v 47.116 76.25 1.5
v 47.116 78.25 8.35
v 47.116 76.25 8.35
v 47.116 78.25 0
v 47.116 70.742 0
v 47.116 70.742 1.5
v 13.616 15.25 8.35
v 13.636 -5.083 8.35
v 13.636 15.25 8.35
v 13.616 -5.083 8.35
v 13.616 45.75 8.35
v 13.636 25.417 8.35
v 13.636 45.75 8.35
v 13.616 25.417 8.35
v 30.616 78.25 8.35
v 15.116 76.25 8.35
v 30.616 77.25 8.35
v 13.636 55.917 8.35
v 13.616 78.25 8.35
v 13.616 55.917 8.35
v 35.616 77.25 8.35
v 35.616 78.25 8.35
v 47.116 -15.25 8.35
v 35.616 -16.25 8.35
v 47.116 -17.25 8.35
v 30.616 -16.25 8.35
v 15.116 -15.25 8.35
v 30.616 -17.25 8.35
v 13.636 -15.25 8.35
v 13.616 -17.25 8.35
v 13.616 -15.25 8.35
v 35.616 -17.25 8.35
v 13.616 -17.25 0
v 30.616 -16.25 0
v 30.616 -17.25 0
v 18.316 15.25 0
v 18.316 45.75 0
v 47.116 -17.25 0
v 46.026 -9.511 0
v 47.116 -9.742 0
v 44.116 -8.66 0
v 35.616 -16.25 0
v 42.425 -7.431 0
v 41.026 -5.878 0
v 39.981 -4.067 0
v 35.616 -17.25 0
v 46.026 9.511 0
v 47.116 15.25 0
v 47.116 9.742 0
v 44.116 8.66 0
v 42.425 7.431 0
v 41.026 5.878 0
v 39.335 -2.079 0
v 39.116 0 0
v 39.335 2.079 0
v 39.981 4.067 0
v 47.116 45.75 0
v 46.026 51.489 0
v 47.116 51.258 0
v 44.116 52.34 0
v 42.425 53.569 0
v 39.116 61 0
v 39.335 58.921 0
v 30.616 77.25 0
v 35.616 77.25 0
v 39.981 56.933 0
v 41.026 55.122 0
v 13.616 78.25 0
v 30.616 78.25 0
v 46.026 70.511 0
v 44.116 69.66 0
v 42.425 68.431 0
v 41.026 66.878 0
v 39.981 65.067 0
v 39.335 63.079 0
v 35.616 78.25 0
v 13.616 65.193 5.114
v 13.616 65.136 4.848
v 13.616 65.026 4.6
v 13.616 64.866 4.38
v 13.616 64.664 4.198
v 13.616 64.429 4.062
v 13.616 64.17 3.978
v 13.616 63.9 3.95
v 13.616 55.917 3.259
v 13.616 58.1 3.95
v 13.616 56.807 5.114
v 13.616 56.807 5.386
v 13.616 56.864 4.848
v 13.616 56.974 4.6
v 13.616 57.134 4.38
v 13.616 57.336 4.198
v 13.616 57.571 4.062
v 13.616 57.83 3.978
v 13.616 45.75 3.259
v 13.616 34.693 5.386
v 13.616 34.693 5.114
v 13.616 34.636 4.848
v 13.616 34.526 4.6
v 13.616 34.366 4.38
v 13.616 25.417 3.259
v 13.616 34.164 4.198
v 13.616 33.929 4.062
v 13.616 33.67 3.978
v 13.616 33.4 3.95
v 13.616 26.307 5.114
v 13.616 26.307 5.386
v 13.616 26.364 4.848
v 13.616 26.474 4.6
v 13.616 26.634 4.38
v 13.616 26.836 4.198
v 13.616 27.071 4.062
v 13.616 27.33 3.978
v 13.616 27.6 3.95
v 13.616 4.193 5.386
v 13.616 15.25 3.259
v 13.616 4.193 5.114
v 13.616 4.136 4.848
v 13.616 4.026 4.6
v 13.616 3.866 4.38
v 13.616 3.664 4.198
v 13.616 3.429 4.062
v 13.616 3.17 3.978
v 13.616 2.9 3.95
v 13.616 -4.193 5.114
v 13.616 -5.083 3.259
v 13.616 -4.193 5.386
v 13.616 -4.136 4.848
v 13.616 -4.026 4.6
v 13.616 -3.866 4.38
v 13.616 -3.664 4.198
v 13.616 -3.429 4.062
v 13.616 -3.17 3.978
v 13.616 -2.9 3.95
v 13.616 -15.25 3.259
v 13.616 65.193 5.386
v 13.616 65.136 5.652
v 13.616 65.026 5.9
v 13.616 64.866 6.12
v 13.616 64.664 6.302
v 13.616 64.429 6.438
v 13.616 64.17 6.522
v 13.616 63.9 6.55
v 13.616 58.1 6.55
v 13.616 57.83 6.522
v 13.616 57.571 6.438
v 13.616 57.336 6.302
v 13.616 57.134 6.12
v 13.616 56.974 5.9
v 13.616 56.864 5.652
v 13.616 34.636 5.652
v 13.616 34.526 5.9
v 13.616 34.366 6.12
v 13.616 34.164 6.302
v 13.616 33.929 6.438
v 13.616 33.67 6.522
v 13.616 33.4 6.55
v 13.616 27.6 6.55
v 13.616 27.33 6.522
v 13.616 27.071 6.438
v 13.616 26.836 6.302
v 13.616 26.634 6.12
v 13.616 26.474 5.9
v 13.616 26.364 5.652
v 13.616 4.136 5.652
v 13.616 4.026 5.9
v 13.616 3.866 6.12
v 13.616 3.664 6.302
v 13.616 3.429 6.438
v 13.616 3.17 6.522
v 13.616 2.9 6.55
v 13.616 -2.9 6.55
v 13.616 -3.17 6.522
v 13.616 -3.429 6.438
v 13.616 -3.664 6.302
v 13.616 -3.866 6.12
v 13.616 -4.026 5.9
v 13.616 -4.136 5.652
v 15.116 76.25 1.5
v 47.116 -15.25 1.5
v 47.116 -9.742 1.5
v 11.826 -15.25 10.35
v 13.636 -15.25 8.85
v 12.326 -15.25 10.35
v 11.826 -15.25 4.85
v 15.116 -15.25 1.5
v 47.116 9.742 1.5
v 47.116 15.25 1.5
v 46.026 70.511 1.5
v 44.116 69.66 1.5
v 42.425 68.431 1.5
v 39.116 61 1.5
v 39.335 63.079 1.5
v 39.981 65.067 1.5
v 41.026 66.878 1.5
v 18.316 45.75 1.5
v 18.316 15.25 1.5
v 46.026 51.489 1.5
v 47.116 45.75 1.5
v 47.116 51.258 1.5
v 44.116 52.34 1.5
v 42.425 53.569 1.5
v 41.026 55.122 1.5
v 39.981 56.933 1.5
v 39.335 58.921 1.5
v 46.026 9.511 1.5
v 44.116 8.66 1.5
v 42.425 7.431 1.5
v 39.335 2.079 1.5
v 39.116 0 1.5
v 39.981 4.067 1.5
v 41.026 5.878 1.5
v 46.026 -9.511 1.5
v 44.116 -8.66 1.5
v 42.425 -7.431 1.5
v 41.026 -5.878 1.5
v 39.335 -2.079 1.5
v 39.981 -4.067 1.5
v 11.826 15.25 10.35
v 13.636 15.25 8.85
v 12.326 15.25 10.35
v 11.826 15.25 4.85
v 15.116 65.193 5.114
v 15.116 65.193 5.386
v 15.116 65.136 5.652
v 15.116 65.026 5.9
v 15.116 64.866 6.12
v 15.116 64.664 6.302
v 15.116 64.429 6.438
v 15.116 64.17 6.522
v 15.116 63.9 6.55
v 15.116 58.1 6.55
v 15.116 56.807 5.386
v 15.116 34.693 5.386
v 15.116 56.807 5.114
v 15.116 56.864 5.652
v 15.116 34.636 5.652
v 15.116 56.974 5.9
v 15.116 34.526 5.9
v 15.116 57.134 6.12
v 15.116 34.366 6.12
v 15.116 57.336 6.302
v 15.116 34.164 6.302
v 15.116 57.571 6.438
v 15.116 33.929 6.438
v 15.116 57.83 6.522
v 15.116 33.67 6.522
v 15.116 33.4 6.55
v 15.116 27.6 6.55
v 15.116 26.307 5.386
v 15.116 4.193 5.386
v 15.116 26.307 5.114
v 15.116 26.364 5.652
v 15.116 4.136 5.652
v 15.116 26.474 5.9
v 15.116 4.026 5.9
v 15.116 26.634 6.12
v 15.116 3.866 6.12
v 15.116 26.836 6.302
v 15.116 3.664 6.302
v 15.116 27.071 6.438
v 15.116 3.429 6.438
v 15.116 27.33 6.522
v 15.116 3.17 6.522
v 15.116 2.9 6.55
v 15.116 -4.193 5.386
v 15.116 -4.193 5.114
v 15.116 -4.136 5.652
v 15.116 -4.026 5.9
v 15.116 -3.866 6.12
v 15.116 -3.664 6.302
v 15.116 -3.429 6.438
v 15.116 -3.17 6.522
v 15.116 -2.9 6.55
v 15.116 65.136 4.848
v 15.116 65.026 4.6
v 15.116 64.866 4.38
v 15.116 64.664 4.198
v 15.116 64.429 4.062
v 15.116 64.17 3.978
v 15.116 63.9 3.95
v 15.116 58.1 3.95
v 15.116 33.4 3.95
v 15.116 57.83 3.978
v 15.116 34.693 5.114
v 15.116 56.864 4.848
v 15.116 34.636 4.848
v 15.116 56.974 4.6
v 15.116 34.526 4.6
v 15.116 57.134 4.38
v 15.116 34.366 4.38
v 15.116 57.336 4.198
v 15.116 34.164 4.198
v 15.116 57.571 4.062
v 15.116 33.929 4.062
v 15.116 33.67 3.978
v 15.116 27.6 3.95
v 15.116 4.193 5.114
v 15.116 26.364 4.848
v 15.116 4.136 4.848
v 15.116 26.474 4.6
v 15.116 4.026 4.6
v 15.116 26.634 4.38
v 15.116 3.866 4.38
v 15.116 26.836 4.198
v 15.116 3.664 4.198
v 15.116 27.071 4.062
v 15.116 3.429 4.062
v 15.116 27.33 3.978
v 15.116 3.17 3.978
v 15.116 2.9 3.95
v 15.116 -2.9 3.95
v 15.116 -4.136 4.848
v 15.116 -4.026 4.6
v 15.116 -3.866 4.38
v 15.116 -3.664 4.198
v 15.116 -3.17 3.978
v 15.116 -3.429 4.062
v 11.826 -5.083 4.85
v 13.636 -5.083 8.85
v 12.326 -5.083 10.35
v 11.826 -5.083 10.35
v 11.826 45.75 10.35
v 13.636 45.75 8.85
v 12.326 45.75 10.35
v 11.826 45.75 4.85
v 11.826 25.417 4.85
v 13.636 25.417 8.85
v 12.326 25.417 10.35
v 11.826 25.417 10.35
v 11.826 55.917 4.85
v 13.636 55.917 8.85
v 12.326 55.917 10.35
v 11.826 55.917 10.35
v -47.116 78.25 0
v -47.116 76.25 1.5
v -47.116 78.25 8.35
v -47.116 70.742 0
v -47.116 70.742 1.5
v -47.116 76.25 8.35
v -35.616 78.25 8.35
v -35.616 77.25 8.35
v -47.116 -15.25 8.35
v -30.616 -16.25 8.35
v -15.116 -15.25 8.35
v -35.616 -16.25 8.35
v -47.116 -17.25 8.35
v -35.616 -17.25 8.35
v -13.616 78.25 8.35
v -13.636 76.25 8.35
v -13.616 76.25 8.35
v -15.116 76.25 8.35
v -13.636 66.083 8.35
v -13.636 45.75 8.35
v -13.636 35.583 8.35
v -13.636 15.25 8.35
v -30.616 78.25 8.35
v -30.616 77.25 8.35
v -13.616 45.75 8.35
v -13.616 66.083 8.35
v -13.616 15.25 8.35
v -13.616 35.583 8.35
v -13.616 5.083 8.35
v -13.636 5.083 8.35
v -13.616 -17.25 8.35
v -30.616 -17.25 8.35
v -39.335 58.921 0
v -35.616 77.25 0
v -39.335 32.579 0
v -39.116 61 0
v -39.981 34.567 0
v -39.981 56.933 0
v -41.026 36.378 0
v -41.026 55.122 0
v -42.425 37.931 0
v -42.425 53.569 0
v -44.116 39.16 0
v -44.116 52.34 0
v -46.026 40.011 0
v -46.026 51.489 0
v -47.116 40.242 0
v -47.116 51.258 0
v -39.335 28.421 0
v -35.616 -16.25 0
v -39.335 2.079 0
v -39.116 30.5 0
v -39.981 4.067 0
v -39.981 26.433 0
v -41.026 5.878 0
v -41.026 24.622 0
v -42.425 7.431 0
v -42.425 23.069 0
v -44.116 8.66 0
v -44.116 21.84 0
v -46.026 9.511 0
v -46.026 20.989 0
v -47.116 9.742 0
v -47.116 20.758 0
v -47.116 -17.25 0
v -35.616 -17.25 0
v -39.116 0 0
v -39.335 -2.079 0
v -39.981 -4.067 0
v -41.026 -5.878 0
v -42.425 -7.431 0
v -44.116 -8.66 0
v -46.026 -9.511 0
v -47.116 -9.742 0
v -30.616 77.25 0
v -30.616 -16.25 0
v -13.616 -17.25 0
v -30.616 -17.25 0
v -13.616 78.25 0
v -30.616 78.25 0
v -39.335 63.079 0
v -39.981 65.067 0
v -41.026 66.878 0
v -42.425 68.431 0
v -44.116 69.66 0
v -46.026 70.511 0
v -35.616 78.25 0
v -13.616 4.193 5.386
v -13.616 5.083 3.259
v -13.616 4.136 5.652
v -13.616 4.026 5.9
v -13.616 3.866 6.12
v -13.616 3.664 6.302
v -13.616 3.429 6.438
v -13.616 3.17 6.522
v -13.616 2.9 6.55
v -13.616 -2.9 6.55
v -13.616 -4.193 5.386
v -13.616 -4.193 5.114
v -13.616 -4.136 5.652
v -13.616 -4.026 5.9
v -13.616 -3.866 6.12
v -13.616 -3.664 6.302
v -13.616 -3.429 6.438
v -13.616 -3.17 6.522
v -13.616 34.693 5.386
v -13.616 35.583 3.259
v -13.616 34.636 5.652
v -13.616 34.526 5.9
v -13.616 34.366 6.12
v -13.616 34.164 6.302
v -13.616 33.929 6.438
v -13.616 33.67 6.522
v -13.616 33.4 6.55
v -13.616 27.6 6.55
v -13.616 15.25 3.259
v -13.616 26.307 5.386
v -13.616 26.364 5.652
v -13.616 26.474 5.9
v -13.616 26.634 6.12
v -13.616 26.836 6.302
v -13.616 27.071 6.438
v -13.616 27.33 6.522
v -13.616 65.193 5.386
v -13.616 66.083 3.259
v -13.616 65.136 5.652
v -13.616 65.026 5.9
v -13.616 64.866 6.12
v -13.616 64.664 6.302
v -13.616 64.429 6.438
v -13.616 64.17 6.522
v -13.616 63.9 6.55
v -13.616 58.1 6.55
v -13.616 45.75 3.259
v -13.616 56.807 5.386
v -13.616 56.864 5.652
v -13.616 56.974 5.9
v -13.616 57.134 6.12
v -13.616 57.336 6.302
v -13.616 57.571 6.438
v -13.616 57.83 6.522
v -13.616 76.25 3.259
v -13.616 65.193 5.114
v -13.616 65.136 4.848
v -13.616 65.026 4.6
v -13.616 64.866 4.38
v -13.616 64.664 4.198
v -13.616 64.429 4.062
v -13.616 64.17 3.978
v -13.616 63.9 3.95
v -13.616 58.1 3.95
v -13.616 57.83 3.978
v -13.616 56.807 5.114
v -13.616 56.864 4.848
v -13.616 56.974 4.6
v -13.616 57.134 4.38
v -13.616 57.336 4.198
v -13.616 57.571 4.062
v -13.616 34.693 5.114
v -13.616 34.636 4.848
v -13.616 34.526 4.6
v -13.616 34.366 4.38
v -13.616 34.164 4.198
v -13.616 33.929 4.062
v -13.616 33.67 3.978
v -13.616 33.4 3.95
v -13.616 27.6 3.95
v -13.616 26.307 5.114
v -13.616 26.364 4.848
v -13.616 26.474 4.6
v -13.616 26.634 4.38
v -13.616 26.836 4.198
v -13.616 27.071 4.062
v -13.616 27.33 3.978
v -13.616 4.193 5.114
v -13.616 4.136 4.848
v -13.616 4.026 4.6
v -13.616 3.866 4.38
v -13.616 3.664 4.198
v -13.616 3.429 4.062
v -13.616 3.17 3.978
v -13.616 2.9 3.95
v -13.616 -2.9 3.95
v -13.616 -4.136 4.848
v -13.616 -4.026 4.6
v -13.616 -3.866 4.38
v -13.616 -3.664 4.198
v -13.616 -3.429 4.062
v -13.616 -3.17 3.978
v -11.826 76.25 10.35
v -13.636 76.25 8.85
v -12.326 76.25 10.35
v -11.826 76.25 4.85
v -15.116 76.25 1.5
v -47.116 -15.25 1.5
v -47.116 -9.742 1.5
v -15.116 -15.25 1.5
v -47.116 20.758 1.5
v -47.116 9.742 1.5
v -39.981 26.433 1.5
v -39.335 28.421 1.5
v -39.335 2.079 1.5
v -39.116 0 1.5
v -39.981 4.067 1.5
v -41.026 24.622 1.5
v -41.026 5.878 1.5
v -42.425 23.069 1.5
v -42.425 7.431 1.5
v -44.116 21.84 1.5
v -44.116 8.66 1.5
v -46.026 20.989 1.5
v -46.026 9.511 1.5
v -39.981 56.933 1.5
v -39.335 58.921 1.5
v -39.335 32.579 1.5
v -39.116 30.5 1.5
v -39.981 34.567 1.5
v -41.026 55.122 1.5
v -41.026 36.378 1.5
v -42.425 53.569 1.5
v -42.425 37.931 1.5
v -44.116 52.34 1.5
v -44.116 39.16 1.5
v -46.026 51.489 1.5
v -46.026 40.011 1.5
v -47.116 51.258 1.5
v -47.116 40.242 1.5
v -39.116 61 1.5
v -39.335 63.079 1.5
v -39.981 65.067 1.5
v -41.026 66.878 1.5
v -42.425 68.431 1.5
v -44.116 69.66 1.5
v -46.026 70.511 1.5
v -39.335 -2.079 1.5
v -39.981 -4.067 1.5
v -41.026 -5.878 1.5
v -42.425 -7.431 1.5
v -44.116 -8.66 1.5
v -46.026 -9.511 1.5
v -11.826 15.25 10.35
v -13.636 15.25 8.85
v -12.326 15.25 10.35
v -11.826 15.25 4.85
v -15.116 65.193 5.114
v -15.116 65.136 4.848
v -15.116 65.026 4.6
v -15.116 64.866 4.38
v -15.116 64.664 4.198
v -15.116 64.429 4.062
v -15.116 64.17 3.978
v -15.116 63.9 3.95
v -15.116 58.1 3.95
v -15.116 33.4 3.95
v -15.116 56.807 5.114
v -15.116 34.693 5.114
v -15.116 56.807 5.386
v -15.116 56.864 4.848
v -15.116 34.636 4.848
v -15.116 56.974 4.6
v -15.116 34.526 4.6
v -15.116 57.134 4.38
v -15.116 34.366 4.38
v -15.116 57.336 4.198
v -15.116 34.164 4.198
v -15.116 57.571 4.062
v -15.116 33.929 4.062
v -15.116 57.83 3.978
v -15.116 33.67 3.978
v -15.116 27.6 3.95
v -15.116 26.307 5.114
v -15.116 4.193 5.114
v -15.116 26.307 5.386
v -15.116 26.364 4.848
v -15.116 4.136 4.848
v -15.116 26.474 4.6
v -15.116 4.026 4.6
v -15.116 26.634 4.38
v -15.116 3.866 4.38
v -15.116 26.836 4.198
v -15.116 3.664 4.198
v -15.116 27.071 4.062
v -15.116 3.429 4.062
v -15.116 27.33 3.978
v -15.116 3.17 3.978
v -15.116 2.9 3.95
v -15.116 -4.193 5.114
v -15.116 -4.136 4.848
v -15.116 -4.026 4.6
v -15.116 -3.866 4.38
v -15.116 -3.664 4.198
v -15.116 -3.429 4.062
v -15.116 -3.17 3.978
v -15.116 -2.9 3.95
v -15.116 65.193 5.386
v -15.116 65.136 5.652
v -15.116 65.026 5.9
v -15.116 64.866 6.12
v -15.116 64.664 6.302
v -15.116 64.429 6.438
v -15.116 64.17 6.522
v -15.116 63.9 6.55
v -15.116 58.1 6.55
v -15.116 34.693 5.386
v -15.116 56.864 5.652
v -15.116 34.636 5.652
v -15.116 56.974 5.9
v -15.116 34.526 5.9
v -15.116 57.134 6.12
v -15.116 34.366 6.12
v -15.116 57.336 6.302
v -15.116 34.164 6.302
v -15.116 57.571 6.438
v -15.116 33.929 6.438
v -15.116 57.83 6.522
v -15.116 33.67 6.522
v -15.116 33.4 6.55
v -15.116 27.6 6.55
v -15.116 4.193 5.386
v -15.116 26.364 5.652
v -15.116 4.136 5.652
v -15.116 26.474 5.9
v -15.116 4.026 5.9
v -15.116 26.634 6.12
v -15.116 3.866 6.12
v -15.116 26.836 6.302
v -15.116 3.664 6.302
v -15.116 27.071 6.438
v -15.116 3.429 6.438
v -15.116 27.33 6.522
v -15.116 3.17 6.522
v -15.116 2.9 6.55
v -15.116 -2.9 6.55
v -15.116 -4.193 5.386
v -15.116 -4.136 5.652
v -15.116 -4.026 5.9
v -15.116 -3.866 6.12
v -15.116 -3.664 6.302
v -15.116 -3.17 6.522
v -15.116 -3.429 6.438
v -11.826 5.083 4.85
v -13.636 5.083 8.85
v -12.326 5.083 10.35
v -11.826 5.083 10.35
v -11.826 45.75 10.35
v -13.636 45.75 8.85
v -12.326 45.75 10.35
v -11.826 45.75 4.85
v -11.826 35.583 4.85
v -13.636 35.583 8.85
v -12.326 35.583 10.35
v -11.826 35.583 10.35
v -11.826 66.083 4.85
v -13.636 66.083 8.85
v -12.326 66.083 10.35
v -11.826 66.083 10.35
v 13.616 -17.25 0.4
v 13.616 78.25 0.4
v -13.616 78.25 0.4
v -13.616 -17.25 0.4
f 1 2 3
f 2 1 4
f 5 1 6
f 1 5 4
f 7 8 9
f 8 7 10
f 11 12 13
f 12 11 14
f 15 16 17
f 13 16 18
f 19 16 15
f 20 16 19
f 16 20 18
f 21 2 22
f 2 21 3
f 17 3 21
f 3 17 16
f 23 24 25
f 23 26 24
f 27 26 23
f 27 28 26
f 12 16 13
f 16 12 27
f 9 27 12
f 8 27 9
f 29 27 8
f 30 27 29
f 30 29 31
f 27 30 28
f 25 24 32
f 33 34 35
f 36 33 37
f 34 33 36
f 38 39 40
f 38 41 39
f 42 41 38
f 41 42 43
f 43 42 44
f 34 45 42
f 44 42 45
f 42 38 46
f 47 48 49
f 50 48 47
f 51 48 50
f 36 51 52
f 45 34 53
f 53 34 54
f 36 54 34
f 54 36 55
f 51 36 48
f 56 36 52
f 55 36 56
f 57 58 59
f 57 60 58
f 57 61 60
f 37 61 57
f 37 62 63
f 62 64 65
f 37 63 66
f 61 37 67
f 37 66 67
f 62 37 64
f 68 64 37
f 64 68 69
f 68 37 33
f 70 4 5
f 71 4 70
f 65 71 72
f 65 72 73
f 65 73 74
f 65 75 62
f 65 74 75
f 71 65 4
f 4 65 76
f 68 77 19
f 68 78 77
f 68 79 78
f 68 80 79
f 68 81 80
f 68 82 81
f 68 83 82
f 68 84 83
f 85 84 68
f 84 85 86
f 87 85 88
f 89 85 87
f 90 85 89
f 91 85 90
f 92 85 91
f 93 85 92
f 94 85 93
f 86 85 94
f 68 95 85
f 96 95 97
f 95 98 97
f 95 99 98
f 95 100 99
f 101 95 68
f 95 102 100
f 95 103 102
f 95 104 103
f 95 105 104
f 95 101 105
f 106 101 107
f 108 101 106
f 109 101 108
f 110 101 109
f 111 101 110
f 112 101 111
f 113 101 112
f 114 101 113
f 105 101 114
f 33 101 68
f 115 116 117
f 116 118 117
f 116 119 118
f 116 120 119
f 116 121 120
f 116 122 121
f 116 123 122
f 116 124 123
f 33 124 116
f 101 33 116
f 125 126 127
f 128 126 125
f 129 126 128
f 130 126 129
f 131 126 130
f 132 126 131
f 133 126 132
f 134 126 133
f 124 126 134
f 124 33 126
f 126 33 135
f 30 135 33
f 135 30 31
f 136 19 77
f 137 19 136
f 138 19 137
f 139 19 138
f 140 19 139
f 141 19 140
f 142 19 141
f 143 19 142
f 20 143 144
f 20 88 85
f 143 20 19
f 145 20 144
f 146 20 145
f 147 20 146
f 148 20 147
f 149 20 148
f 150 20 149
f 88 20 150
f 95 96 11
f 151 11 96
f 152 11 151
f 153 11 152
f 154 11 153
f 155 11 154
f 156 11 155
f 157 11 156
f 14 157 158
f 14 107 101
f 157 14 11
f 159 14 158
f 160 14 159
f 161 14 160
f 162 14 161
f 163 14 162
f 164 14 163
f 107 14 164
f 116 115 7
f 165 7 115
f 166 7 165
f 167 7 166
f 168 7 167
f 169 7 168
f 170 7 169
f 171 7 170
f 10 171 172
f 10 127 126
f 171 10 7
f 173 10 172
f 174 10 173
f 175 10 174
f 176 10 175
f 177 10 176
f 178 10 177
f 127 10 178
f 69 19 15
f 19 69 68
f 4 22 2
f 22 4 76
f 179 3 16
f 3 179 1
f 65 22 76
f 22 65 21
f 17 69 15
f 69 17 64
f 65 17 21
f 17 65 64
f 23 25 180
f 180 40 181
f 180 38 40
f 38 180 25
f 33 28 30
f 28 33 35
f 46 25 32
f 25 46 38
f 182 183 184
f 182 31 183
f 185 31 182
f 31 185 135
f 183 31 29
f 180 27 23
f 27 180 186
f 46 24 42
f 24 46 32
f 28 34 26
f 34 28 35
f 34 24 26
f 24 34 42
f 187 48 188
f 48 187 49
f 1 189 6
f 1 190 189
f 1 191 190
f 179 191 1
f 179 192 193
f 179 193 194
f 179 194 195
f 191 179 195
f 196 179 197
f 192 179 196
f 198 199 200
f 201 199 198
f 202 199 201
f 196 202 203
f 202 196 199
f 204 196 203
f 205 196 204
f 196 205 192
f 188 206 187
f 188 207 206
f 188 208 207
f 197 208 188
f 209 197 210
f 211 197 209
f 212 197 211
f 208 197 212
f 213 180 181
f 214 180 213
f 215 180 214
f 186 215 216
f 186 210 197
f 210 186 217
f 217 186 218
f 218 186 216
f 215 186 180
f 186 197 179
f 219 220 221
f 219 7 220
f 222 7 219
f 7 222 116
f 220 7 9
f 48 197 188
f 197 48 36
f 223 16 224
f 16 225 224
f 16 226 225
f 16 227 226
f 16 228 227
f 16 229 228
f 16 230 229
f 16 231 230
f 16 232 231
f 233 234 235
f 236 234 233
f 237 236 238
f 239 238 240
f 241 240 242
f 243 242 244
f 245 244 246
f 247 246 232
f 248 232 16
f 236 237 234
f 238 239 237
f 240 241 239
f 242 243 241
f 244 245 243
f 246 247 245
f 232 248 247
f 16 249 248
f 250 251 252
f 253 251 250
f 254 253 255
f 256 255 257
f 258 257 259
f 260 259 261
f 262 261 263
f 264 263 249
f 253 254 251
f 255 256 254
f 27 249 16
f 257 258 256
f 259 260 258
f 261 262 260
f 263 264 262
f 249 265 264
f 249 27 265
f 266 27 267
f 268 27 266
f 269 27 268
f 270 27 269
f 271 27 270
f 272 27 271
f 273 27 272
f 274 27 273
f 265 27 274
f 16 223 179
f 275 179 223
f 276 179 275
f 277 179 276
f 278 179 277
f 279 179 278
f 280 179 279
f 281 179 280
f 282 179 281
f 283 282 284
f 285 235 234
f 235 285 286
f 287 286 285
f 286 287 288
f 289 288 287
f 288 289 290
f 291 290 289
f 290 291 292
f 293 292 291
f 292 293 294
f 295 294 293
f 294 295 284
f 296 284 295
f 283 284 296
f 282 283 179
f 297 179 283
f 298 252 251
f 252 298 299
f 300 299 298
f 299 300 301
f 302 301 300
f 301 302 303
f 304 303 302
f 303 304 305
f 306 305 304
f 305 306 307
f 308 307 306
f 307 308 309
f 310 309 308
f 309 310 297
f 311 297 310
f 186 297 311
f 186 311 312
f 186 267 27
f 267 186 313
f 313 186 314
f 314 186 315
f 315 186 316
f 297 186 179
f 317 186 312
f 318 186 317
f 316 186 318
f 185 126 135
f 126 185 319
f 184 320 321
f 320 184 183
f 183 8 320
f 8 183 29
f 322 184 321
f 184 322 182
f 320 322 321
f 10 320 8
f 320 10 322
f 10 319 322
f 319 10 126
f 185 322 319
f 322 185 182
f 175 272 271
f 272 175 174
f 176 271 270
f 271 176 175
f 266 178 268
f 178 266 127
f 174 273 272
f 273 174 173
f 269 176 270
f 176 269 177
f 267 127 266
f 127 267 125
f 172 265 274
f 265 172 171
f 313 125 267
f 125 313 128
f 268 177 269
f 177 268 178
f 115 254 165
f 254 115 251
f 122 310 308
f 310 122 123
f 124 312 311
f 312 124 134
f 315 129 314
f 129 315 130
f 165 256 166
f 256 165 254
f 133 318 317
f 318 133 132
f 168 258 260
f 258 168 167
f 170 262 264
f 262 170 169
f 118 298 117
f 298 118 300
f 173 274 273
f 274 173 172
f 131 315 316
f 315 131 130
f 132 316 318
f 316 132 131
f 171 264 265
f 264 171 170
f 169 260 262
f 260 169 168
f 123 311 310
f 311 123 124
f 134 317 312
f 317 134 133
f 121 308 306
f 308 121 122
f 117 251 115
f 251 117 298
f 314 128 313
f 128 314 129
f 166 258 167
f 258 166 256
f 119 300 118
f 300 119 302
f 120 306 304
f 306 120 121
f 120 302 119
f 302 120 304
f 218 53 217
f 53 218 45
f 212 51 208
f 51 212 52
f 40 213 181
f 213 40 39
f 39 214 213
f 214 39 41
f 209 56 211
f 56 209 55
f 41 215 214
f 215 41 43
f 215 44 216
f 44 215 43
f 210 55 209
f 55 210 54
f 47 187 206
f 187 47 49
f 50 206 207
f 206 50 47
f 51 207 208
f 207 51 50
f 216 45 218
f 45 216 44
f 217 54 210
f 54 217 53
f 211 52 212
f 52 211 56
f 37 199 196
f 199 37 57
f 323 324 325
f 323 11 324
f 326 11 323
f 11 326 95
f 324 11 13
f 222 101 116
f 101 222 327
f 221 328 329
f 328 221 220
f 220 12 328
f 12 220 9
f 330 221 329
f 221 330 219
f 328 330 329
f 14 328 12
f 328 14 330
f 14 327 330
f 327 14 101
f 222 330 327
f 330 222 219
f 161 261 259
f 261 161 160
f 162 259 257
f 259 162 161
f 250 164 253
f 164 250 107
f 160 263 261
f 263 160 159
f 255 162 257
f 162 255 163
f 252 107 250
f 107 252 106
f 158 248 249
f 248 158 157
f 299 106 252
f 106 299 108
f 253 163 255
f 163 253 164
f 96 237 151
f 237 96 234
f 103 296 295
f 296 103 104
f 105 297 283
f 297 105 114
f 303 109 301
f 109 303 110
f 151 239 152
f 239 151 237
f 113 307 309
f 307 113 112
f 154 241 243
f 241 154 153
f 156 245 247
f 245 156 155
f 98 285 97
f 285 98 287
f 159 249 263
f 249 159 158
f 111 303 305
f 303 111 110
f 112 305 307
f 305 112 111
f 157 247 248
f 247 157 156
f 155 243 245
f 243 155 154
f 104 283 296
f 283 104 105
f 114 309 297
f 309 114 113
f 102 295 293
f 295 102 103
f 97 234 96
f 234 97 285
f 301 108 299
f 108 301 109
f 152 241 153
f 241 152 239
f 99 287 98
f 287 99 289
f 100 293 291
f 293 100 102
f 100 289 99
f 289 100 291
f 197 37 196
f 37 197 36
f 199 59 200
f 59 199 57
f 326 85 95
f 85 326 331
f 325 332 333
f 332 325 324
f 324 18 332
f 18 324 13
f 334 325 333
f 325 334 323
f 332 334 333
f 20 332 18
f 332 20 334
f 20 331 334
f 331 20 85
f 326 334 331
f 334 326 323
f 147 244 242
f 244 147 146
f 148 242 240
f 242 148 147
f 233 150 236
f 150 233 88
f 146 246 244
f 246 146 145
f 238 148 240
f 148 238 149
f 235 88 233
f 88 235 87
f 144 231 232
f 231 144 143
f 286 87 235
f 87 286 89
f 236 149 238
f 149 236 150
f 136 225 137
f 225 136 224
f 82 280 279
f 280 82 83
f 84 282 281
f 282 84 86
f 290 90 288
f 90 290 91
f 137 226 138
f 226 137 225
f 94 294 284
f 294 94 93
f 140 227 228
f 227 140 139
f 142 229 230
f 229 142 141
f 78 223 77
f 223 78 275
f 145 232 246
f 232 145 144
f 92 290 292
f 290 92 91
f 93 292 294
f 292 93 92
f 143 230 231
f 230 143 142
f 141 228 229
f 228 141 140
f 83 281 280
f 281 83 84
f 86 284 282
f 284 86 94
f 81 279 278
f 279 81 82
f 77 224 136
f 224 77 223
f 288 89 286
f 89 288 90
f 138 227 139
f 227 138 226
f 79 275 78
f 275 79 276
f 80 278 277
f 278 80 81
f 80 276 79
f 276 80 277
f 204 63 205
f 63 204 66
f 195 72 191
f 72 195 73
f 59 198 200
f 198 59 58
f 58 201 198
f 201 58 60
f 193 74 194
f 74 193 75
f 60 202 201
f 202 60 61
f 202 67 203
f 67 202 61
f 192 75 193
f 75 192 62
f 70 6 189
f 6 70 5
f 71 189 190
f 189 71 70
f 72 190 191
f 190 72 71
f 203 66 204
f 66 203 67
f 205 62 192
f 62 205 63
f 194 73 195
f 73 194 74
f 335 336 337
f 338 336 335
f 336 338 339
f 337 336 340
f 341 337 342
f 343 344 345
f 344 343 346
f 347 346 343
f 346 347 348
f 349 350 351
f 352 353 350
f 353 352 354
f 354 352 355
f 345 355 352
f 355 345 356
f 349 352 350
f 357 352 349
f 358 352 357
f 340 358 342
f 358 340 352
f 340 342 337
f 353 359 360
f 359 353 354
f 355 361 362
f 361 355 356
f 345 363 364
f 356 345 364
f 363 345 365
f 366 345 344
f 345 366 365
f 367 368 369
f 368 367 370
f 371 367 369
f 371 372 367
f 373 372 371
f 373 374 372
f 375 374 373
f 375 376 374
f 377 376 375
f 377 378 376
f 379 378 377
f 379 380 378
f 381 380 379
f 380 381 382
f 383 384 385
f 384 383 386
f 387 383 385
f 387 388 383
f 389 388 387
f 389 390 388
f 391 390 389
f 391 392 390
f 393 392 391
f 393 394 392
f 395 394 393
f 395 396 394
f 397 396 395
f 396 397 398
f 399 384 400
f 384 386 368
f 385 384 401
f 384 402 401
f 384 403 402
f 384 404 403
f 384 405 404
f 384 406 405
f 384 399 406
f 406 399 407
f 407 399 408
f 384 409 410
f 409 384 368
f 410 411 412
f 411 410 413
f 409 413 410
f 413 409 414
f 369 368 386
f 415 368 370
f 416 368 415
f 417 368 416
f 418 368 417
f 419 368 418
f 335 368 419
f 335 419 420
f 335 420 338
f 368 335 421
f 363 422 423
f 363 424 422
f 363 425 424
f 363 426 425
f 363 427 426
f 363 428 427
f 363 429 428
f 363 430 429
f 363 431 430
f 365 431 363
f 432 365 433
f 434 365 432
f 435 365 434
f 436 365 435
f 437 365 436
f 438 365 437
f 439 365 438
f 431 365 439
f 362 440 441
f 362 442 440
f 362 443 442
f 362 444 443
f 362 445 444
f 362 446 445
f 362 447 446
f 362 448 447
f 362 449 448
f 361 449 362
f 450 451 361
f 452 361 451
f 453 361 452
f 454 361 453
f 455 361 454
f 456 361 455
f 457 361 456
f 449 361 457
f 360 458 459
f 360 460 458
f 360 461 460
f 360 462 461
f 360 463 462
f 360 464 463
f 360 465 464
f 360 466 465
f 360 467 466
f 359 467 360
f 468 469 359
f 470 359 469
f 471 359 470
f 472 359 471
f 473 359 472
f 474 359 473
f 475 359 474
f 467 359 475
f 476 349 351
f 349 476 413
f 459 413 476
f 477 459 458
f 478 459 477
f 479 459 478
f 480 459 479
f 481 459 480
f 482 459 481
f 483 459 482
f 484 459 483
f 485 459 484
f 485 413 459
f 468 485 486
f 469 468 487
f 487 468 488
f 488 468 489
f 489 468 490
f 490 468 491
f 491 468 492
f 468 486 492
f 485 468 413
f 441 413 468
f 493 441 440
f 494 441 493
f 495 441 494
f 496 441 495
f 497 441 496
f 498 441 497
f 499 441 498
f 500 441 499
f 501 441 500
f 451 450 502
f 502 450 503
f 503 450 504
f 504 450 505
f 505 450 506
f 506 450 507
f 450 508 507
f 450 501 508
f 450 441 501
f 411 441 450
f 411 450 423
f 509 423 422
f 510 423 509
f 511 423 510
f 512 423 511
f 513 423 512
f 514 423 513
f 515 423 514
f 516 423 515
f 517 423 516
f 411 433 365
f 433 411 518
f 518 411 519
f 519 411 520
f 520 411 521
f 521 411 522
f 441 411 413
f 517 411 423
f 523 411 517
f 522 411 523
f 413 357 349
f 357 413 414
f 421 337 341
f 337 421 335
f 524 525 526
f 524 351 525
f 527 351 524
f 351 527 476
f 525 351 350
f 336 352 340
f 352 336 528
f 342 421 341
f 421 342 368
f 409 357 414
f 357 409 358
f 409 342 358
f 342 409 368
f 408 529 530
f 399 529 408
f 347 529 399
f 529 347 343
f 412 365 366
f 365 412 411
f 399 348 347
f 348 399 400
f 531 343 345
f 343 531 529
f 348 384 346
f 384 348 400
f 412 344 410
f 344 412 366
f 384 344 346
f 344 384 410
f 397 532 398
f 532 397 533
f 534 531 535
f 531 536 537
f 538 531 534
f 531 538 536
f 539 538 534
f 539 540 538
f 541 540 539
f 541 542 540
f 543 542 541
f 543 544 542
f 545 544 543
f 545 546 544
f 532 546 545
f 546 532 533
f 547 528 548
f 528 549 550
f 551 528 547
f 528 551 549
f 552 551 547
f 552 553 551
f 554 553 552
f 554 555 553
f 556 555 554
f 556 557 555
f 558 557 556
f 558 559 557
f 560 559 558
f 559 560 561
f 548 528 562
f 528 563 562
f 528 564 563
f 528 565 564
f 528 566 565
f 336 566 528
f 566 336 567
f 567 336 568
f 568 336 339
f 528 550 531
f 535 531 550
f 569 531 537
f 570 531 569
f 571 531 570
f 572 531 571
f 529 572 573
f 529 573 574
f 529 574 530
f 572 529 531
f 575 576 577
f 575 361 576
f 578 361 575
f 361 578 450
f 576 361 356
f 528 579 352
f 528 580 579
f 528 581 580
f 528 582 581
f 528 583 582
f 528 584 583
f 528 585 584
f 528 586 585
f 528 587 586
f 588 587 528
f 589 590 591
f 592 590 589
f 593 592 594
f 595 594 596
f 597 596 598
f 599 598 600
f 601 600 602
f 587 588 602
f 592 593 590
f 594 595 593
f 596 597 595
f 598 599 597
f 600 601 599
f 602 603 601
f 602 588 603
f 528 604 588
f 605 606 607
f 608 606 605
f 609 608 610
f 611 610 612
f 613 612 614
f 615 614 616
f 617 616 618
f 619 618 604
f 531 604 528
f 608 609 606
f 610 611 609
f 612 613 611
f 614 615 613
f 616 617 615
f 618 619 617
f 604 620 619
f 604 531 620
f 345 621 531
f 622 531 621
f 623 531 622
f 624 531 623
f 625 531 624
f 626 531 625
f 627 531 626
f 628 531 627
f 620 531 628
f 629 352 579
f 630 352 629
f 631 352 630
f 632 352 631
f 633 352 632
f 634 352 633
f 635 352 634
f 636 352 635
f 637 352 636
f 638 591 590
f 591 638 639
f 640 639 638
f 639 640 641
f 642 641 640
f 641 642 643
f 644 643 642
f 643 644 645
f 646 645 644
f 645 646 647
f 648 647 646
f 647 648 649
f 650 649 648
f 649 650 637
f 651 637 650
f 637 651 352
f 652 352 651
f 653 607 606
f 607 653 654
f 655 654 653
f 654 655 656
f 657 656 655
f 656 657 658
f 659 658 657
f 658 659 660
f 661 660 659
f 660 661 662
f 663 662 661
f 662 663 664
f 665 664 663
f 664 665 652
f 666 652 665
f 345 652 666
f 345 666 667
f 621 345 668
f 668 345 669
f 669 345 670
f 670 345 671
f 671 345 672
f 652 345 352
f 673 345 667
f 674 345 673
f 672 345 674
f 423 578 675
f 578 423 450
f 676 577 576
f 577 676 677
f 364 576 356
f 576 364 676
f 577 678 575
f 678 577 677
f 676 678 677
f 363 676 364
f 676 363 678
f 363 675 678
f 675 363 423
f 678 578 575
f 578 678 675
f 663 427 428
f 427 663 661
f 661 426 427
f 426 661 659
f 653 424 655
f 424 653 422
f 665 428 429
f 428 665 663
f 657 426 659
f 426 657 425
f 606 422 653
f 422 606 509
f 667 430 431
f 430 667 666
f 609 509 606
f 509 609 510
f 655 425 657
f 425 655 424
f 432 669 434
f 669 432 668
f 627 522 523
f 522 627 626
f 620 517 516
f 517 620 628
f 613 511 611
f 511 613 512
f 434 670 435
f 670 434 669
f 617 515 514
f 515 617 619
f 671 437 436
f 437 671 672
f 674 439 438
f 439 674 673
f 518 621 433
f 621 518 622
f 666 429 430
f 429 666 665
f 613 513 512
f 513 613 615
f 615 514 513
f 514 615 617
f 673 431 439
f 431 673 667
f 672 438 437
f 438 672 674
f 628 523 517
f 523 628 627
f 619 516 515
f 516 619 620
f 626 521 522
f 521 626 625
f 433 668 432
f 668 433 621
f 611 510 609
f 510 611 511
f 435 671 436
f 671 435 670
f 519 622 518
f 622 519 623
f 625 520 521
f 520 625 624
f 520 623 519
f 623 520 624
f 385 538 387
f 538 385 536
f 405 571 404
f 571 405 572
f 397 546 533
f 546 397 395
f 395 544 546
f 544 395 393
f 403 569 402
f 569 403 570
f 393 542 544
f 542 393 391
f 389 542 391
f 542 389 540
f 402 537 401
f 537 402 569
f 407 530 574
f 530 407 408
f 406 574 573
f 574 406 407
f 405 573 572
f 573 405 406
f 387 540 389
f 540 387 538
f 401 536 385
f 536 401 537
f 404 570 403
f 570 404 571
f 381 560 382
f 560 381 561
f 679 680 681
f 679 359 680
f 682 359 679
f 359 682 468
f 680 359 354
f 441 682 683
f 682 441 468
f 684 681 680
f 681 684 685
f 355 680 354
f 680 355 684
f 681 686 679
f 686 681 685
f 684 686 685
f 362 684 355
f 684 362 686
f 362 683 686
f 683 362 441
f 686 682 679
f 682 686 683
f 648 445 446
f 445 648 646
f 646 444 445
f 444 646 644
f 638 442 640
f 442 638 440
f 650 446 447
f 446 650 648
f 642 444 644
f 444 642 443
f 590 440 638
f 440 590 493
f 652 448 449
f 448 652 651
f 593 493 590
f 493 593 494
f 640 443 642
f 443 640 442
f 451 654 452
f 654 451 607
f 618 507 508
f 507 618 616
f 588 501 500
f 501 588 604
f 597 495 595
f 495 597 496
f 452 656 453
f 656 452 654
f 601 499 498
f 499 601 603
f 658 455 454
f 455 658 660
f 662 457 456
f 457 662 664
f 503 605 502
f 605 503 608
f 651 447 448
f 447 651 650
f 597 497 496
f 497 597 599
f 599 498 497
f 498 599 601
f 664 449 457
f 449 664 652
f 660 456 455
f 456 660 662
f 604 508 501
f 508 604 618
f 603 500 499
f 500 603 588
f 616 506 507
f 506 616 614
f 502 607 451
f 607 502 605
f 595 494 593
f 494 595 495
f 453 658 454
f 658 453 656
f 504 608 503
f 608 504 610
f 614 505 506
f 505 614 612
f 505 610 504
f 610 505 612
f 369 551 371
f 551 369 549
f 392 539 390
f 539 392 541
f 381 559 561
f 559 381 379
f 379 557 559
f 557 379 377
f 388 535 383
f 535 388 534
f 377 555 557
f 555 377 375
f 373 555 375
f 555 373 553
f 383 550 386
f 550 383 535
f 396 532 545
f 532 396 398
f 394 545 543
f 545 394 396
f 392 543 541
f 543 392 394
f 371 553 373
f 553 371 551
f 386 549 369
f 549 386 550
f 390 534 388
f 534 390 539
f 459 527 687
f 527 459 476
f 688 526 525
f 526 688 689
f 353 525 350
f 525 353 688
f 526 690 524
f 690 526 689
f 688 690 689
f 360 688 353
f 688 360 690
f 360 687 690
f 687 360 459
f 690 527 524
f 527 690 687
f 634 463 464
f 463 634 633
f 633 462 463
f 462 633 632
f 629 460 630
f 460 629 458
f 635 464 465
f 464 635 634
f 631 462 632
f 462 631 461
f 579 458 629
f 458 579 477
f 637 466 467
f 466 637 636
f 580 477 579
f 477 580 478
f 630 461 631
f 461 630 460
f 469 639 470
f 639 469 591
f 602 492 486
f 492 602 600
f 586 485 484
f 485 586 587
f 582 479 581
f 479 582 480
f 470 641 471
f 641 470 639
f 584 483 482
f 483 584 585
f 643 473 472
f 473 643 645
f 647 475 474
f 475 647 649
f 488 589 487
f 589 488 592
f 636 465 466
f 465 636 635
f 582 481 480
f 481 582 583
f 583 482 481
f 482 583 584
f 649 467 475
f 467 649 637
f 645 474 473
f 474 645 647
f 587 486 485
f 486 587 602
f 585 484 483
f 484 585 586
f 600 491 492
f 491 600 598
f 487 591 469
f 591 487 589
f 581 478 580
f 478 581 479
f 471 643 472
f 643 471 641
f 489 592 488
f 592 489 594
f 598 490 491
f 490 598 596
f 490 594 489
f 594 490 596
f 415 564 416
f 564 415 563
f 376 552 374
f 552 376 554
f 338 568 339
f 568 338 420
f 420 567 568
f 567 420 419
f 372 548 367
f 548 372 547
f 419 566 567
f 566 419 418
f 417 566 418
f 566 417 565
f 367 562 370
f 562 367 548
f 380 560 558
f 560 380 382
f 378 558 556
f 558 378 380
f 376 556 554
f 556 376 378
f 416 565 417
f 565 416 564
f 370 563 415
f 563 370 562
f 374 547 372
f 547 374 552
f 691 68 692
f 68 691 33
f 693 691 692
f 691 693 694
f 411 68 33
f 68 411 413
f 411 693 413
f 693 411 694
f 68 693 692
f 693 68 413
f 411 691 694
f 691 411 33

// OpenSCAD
$fn=30;
e=0.01;

part_w=32;
part_h=30.5;
part_t=6.85;
wall=1.5;
living_hinge_thick=0.4;
side_wall=2;
usb_offset=3.75;

hinge_extra=1;  // a bit longer for more relief.
hinge_len=PI*(part_t+wall)+hinge_extra;

part_count=3;

module usb(r=2.6/2) {
  w=8.4;
  rotate([0, 90, 0]) hull() {
    translate([0, -w/2+r, 0]) cylinder(r=r, h=7);
    translate([0, +w/2-r, 0]) cylinder(r=r, h=7);
  }
}

module part(usb_extra=0, with_ether=false) {
  difference() {
    translate([0, -part_h/2, 0]) {
      cube([part_w+wall, part_h, wall]);  // bottom
      cube([wall, part_h, part_t+wall]);  // front

      lock_width=1.2*wall;
      start_at=max(0, part_t-4);
      color("red") translate([-lock_width+e, 0, start_at]) hull() {  // lock
	translate([0, 0, 2]) cube([0.5, part_h/3, part_t+wall-start_at]);
	translate([lock_width, 0, living_hinge_thick]) {
	  cube([e, part_h/3, part_t+wall-living_hinge_thick+0.5-start_at]);
	}
      }
    }
    translate([-1, 0, wall+usb_offset+usb_extra]) usb();
    translate([part_w+wall+2, 0, -e]) cylinder(r=10, h=wall+1);
    if (with_ether) {
      translate([wall+3.2, -part_h/2, -e]) cube([part_w, part_h, wall+2*e]);
    }
  }
}

module side() {
  difference() {
    translate([0, part_h/2, 0]) cube([part_w+wall, side_wall, part_t+wall]);
    // slot for rubber-band
    translate([part_w-15, part_h/2+1, -e]) cube([5, side_wall, part_t+wall+2*e]);
  }
}

module living_hinge(w=part_h) {
  translate([-hinge_len/2, -part_h/2, 0]) {
    cube([hinge_len, w, 0.4]);
  }
}

module row(ether_at=100, mirror=false) {
  sf=mirror ? -1 : 1;

  scale([sf, 1, 1]) {
    translate([hinge_len/2, (part_count-1)*part_h, 0]) side();
    translate([hinge_len/2, 0, 0]) scale([1, -1, 1]) side();
  }
  for (i=[0:1:part_count-e]) {
    translate([0, i*part_h, 0]) scale([sf, sf, 1]) translate([hinge_len/2, 0, 0]) part(with_ether=(i == ether_at));
  }
}

if (true) {
  row(ether_at=1);
  row(mirror=true);
  translate([0, -side_wall, 0]) living_hinge(part_h*part_count+2*side_wall);
 }
